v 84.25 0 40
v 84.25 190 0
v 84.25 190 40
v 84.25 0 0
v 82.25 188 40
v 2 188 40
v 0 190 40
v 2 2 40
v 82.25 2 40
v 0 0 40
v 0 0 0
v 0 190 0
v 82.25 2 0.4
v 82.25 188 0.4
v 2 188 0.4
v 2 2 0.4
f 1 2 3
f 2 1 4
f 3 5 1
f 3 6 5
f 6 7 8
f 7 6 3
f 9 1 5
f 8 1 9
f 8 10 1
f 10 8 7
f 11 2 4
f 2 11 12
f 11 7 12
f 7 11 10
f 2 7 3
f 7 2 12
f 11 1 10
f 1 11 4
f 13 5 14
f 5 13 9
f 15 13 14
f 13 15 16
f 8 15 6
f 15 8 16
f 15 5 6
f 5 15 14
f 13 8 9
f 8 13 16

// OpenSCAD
// file: bins.scad
// Drawer Measurements (frontal perspective)
drawer_width = 345;
drawer_depth = 285;
drawer_height = 40;

module bin(width, depth, wall_thickness, floor_thickness) {
    difference() {
        cube([width, depth, drawer_height]);
        translate([
            wall_thickness, wall_thickness, floor_thickness
        ]) cube([
            width - 2 * wall_thickness,
            depth - 2 * wall_thickness,
            drawer_height - floor_thickness
        ]);
    }
}

bin_width_unit = drawer_width / 4;
bin_depth_unit = drawer_depth / 3;

module unit_bin(width_units, depth_units) {
    bin(
        width_units * bin_width_unit,
        depth_units * bin_depth_unit,
        2,
        0.4
    );
}
// main file
include <bins.scad>

adjustment = 2;

module adjusted_bin() {
    bin(
        1 * bin_width_unit - adjustment,
        2 * bin_depth_unit,
        2,
        0.4
    );
}

adjusted_bin();
